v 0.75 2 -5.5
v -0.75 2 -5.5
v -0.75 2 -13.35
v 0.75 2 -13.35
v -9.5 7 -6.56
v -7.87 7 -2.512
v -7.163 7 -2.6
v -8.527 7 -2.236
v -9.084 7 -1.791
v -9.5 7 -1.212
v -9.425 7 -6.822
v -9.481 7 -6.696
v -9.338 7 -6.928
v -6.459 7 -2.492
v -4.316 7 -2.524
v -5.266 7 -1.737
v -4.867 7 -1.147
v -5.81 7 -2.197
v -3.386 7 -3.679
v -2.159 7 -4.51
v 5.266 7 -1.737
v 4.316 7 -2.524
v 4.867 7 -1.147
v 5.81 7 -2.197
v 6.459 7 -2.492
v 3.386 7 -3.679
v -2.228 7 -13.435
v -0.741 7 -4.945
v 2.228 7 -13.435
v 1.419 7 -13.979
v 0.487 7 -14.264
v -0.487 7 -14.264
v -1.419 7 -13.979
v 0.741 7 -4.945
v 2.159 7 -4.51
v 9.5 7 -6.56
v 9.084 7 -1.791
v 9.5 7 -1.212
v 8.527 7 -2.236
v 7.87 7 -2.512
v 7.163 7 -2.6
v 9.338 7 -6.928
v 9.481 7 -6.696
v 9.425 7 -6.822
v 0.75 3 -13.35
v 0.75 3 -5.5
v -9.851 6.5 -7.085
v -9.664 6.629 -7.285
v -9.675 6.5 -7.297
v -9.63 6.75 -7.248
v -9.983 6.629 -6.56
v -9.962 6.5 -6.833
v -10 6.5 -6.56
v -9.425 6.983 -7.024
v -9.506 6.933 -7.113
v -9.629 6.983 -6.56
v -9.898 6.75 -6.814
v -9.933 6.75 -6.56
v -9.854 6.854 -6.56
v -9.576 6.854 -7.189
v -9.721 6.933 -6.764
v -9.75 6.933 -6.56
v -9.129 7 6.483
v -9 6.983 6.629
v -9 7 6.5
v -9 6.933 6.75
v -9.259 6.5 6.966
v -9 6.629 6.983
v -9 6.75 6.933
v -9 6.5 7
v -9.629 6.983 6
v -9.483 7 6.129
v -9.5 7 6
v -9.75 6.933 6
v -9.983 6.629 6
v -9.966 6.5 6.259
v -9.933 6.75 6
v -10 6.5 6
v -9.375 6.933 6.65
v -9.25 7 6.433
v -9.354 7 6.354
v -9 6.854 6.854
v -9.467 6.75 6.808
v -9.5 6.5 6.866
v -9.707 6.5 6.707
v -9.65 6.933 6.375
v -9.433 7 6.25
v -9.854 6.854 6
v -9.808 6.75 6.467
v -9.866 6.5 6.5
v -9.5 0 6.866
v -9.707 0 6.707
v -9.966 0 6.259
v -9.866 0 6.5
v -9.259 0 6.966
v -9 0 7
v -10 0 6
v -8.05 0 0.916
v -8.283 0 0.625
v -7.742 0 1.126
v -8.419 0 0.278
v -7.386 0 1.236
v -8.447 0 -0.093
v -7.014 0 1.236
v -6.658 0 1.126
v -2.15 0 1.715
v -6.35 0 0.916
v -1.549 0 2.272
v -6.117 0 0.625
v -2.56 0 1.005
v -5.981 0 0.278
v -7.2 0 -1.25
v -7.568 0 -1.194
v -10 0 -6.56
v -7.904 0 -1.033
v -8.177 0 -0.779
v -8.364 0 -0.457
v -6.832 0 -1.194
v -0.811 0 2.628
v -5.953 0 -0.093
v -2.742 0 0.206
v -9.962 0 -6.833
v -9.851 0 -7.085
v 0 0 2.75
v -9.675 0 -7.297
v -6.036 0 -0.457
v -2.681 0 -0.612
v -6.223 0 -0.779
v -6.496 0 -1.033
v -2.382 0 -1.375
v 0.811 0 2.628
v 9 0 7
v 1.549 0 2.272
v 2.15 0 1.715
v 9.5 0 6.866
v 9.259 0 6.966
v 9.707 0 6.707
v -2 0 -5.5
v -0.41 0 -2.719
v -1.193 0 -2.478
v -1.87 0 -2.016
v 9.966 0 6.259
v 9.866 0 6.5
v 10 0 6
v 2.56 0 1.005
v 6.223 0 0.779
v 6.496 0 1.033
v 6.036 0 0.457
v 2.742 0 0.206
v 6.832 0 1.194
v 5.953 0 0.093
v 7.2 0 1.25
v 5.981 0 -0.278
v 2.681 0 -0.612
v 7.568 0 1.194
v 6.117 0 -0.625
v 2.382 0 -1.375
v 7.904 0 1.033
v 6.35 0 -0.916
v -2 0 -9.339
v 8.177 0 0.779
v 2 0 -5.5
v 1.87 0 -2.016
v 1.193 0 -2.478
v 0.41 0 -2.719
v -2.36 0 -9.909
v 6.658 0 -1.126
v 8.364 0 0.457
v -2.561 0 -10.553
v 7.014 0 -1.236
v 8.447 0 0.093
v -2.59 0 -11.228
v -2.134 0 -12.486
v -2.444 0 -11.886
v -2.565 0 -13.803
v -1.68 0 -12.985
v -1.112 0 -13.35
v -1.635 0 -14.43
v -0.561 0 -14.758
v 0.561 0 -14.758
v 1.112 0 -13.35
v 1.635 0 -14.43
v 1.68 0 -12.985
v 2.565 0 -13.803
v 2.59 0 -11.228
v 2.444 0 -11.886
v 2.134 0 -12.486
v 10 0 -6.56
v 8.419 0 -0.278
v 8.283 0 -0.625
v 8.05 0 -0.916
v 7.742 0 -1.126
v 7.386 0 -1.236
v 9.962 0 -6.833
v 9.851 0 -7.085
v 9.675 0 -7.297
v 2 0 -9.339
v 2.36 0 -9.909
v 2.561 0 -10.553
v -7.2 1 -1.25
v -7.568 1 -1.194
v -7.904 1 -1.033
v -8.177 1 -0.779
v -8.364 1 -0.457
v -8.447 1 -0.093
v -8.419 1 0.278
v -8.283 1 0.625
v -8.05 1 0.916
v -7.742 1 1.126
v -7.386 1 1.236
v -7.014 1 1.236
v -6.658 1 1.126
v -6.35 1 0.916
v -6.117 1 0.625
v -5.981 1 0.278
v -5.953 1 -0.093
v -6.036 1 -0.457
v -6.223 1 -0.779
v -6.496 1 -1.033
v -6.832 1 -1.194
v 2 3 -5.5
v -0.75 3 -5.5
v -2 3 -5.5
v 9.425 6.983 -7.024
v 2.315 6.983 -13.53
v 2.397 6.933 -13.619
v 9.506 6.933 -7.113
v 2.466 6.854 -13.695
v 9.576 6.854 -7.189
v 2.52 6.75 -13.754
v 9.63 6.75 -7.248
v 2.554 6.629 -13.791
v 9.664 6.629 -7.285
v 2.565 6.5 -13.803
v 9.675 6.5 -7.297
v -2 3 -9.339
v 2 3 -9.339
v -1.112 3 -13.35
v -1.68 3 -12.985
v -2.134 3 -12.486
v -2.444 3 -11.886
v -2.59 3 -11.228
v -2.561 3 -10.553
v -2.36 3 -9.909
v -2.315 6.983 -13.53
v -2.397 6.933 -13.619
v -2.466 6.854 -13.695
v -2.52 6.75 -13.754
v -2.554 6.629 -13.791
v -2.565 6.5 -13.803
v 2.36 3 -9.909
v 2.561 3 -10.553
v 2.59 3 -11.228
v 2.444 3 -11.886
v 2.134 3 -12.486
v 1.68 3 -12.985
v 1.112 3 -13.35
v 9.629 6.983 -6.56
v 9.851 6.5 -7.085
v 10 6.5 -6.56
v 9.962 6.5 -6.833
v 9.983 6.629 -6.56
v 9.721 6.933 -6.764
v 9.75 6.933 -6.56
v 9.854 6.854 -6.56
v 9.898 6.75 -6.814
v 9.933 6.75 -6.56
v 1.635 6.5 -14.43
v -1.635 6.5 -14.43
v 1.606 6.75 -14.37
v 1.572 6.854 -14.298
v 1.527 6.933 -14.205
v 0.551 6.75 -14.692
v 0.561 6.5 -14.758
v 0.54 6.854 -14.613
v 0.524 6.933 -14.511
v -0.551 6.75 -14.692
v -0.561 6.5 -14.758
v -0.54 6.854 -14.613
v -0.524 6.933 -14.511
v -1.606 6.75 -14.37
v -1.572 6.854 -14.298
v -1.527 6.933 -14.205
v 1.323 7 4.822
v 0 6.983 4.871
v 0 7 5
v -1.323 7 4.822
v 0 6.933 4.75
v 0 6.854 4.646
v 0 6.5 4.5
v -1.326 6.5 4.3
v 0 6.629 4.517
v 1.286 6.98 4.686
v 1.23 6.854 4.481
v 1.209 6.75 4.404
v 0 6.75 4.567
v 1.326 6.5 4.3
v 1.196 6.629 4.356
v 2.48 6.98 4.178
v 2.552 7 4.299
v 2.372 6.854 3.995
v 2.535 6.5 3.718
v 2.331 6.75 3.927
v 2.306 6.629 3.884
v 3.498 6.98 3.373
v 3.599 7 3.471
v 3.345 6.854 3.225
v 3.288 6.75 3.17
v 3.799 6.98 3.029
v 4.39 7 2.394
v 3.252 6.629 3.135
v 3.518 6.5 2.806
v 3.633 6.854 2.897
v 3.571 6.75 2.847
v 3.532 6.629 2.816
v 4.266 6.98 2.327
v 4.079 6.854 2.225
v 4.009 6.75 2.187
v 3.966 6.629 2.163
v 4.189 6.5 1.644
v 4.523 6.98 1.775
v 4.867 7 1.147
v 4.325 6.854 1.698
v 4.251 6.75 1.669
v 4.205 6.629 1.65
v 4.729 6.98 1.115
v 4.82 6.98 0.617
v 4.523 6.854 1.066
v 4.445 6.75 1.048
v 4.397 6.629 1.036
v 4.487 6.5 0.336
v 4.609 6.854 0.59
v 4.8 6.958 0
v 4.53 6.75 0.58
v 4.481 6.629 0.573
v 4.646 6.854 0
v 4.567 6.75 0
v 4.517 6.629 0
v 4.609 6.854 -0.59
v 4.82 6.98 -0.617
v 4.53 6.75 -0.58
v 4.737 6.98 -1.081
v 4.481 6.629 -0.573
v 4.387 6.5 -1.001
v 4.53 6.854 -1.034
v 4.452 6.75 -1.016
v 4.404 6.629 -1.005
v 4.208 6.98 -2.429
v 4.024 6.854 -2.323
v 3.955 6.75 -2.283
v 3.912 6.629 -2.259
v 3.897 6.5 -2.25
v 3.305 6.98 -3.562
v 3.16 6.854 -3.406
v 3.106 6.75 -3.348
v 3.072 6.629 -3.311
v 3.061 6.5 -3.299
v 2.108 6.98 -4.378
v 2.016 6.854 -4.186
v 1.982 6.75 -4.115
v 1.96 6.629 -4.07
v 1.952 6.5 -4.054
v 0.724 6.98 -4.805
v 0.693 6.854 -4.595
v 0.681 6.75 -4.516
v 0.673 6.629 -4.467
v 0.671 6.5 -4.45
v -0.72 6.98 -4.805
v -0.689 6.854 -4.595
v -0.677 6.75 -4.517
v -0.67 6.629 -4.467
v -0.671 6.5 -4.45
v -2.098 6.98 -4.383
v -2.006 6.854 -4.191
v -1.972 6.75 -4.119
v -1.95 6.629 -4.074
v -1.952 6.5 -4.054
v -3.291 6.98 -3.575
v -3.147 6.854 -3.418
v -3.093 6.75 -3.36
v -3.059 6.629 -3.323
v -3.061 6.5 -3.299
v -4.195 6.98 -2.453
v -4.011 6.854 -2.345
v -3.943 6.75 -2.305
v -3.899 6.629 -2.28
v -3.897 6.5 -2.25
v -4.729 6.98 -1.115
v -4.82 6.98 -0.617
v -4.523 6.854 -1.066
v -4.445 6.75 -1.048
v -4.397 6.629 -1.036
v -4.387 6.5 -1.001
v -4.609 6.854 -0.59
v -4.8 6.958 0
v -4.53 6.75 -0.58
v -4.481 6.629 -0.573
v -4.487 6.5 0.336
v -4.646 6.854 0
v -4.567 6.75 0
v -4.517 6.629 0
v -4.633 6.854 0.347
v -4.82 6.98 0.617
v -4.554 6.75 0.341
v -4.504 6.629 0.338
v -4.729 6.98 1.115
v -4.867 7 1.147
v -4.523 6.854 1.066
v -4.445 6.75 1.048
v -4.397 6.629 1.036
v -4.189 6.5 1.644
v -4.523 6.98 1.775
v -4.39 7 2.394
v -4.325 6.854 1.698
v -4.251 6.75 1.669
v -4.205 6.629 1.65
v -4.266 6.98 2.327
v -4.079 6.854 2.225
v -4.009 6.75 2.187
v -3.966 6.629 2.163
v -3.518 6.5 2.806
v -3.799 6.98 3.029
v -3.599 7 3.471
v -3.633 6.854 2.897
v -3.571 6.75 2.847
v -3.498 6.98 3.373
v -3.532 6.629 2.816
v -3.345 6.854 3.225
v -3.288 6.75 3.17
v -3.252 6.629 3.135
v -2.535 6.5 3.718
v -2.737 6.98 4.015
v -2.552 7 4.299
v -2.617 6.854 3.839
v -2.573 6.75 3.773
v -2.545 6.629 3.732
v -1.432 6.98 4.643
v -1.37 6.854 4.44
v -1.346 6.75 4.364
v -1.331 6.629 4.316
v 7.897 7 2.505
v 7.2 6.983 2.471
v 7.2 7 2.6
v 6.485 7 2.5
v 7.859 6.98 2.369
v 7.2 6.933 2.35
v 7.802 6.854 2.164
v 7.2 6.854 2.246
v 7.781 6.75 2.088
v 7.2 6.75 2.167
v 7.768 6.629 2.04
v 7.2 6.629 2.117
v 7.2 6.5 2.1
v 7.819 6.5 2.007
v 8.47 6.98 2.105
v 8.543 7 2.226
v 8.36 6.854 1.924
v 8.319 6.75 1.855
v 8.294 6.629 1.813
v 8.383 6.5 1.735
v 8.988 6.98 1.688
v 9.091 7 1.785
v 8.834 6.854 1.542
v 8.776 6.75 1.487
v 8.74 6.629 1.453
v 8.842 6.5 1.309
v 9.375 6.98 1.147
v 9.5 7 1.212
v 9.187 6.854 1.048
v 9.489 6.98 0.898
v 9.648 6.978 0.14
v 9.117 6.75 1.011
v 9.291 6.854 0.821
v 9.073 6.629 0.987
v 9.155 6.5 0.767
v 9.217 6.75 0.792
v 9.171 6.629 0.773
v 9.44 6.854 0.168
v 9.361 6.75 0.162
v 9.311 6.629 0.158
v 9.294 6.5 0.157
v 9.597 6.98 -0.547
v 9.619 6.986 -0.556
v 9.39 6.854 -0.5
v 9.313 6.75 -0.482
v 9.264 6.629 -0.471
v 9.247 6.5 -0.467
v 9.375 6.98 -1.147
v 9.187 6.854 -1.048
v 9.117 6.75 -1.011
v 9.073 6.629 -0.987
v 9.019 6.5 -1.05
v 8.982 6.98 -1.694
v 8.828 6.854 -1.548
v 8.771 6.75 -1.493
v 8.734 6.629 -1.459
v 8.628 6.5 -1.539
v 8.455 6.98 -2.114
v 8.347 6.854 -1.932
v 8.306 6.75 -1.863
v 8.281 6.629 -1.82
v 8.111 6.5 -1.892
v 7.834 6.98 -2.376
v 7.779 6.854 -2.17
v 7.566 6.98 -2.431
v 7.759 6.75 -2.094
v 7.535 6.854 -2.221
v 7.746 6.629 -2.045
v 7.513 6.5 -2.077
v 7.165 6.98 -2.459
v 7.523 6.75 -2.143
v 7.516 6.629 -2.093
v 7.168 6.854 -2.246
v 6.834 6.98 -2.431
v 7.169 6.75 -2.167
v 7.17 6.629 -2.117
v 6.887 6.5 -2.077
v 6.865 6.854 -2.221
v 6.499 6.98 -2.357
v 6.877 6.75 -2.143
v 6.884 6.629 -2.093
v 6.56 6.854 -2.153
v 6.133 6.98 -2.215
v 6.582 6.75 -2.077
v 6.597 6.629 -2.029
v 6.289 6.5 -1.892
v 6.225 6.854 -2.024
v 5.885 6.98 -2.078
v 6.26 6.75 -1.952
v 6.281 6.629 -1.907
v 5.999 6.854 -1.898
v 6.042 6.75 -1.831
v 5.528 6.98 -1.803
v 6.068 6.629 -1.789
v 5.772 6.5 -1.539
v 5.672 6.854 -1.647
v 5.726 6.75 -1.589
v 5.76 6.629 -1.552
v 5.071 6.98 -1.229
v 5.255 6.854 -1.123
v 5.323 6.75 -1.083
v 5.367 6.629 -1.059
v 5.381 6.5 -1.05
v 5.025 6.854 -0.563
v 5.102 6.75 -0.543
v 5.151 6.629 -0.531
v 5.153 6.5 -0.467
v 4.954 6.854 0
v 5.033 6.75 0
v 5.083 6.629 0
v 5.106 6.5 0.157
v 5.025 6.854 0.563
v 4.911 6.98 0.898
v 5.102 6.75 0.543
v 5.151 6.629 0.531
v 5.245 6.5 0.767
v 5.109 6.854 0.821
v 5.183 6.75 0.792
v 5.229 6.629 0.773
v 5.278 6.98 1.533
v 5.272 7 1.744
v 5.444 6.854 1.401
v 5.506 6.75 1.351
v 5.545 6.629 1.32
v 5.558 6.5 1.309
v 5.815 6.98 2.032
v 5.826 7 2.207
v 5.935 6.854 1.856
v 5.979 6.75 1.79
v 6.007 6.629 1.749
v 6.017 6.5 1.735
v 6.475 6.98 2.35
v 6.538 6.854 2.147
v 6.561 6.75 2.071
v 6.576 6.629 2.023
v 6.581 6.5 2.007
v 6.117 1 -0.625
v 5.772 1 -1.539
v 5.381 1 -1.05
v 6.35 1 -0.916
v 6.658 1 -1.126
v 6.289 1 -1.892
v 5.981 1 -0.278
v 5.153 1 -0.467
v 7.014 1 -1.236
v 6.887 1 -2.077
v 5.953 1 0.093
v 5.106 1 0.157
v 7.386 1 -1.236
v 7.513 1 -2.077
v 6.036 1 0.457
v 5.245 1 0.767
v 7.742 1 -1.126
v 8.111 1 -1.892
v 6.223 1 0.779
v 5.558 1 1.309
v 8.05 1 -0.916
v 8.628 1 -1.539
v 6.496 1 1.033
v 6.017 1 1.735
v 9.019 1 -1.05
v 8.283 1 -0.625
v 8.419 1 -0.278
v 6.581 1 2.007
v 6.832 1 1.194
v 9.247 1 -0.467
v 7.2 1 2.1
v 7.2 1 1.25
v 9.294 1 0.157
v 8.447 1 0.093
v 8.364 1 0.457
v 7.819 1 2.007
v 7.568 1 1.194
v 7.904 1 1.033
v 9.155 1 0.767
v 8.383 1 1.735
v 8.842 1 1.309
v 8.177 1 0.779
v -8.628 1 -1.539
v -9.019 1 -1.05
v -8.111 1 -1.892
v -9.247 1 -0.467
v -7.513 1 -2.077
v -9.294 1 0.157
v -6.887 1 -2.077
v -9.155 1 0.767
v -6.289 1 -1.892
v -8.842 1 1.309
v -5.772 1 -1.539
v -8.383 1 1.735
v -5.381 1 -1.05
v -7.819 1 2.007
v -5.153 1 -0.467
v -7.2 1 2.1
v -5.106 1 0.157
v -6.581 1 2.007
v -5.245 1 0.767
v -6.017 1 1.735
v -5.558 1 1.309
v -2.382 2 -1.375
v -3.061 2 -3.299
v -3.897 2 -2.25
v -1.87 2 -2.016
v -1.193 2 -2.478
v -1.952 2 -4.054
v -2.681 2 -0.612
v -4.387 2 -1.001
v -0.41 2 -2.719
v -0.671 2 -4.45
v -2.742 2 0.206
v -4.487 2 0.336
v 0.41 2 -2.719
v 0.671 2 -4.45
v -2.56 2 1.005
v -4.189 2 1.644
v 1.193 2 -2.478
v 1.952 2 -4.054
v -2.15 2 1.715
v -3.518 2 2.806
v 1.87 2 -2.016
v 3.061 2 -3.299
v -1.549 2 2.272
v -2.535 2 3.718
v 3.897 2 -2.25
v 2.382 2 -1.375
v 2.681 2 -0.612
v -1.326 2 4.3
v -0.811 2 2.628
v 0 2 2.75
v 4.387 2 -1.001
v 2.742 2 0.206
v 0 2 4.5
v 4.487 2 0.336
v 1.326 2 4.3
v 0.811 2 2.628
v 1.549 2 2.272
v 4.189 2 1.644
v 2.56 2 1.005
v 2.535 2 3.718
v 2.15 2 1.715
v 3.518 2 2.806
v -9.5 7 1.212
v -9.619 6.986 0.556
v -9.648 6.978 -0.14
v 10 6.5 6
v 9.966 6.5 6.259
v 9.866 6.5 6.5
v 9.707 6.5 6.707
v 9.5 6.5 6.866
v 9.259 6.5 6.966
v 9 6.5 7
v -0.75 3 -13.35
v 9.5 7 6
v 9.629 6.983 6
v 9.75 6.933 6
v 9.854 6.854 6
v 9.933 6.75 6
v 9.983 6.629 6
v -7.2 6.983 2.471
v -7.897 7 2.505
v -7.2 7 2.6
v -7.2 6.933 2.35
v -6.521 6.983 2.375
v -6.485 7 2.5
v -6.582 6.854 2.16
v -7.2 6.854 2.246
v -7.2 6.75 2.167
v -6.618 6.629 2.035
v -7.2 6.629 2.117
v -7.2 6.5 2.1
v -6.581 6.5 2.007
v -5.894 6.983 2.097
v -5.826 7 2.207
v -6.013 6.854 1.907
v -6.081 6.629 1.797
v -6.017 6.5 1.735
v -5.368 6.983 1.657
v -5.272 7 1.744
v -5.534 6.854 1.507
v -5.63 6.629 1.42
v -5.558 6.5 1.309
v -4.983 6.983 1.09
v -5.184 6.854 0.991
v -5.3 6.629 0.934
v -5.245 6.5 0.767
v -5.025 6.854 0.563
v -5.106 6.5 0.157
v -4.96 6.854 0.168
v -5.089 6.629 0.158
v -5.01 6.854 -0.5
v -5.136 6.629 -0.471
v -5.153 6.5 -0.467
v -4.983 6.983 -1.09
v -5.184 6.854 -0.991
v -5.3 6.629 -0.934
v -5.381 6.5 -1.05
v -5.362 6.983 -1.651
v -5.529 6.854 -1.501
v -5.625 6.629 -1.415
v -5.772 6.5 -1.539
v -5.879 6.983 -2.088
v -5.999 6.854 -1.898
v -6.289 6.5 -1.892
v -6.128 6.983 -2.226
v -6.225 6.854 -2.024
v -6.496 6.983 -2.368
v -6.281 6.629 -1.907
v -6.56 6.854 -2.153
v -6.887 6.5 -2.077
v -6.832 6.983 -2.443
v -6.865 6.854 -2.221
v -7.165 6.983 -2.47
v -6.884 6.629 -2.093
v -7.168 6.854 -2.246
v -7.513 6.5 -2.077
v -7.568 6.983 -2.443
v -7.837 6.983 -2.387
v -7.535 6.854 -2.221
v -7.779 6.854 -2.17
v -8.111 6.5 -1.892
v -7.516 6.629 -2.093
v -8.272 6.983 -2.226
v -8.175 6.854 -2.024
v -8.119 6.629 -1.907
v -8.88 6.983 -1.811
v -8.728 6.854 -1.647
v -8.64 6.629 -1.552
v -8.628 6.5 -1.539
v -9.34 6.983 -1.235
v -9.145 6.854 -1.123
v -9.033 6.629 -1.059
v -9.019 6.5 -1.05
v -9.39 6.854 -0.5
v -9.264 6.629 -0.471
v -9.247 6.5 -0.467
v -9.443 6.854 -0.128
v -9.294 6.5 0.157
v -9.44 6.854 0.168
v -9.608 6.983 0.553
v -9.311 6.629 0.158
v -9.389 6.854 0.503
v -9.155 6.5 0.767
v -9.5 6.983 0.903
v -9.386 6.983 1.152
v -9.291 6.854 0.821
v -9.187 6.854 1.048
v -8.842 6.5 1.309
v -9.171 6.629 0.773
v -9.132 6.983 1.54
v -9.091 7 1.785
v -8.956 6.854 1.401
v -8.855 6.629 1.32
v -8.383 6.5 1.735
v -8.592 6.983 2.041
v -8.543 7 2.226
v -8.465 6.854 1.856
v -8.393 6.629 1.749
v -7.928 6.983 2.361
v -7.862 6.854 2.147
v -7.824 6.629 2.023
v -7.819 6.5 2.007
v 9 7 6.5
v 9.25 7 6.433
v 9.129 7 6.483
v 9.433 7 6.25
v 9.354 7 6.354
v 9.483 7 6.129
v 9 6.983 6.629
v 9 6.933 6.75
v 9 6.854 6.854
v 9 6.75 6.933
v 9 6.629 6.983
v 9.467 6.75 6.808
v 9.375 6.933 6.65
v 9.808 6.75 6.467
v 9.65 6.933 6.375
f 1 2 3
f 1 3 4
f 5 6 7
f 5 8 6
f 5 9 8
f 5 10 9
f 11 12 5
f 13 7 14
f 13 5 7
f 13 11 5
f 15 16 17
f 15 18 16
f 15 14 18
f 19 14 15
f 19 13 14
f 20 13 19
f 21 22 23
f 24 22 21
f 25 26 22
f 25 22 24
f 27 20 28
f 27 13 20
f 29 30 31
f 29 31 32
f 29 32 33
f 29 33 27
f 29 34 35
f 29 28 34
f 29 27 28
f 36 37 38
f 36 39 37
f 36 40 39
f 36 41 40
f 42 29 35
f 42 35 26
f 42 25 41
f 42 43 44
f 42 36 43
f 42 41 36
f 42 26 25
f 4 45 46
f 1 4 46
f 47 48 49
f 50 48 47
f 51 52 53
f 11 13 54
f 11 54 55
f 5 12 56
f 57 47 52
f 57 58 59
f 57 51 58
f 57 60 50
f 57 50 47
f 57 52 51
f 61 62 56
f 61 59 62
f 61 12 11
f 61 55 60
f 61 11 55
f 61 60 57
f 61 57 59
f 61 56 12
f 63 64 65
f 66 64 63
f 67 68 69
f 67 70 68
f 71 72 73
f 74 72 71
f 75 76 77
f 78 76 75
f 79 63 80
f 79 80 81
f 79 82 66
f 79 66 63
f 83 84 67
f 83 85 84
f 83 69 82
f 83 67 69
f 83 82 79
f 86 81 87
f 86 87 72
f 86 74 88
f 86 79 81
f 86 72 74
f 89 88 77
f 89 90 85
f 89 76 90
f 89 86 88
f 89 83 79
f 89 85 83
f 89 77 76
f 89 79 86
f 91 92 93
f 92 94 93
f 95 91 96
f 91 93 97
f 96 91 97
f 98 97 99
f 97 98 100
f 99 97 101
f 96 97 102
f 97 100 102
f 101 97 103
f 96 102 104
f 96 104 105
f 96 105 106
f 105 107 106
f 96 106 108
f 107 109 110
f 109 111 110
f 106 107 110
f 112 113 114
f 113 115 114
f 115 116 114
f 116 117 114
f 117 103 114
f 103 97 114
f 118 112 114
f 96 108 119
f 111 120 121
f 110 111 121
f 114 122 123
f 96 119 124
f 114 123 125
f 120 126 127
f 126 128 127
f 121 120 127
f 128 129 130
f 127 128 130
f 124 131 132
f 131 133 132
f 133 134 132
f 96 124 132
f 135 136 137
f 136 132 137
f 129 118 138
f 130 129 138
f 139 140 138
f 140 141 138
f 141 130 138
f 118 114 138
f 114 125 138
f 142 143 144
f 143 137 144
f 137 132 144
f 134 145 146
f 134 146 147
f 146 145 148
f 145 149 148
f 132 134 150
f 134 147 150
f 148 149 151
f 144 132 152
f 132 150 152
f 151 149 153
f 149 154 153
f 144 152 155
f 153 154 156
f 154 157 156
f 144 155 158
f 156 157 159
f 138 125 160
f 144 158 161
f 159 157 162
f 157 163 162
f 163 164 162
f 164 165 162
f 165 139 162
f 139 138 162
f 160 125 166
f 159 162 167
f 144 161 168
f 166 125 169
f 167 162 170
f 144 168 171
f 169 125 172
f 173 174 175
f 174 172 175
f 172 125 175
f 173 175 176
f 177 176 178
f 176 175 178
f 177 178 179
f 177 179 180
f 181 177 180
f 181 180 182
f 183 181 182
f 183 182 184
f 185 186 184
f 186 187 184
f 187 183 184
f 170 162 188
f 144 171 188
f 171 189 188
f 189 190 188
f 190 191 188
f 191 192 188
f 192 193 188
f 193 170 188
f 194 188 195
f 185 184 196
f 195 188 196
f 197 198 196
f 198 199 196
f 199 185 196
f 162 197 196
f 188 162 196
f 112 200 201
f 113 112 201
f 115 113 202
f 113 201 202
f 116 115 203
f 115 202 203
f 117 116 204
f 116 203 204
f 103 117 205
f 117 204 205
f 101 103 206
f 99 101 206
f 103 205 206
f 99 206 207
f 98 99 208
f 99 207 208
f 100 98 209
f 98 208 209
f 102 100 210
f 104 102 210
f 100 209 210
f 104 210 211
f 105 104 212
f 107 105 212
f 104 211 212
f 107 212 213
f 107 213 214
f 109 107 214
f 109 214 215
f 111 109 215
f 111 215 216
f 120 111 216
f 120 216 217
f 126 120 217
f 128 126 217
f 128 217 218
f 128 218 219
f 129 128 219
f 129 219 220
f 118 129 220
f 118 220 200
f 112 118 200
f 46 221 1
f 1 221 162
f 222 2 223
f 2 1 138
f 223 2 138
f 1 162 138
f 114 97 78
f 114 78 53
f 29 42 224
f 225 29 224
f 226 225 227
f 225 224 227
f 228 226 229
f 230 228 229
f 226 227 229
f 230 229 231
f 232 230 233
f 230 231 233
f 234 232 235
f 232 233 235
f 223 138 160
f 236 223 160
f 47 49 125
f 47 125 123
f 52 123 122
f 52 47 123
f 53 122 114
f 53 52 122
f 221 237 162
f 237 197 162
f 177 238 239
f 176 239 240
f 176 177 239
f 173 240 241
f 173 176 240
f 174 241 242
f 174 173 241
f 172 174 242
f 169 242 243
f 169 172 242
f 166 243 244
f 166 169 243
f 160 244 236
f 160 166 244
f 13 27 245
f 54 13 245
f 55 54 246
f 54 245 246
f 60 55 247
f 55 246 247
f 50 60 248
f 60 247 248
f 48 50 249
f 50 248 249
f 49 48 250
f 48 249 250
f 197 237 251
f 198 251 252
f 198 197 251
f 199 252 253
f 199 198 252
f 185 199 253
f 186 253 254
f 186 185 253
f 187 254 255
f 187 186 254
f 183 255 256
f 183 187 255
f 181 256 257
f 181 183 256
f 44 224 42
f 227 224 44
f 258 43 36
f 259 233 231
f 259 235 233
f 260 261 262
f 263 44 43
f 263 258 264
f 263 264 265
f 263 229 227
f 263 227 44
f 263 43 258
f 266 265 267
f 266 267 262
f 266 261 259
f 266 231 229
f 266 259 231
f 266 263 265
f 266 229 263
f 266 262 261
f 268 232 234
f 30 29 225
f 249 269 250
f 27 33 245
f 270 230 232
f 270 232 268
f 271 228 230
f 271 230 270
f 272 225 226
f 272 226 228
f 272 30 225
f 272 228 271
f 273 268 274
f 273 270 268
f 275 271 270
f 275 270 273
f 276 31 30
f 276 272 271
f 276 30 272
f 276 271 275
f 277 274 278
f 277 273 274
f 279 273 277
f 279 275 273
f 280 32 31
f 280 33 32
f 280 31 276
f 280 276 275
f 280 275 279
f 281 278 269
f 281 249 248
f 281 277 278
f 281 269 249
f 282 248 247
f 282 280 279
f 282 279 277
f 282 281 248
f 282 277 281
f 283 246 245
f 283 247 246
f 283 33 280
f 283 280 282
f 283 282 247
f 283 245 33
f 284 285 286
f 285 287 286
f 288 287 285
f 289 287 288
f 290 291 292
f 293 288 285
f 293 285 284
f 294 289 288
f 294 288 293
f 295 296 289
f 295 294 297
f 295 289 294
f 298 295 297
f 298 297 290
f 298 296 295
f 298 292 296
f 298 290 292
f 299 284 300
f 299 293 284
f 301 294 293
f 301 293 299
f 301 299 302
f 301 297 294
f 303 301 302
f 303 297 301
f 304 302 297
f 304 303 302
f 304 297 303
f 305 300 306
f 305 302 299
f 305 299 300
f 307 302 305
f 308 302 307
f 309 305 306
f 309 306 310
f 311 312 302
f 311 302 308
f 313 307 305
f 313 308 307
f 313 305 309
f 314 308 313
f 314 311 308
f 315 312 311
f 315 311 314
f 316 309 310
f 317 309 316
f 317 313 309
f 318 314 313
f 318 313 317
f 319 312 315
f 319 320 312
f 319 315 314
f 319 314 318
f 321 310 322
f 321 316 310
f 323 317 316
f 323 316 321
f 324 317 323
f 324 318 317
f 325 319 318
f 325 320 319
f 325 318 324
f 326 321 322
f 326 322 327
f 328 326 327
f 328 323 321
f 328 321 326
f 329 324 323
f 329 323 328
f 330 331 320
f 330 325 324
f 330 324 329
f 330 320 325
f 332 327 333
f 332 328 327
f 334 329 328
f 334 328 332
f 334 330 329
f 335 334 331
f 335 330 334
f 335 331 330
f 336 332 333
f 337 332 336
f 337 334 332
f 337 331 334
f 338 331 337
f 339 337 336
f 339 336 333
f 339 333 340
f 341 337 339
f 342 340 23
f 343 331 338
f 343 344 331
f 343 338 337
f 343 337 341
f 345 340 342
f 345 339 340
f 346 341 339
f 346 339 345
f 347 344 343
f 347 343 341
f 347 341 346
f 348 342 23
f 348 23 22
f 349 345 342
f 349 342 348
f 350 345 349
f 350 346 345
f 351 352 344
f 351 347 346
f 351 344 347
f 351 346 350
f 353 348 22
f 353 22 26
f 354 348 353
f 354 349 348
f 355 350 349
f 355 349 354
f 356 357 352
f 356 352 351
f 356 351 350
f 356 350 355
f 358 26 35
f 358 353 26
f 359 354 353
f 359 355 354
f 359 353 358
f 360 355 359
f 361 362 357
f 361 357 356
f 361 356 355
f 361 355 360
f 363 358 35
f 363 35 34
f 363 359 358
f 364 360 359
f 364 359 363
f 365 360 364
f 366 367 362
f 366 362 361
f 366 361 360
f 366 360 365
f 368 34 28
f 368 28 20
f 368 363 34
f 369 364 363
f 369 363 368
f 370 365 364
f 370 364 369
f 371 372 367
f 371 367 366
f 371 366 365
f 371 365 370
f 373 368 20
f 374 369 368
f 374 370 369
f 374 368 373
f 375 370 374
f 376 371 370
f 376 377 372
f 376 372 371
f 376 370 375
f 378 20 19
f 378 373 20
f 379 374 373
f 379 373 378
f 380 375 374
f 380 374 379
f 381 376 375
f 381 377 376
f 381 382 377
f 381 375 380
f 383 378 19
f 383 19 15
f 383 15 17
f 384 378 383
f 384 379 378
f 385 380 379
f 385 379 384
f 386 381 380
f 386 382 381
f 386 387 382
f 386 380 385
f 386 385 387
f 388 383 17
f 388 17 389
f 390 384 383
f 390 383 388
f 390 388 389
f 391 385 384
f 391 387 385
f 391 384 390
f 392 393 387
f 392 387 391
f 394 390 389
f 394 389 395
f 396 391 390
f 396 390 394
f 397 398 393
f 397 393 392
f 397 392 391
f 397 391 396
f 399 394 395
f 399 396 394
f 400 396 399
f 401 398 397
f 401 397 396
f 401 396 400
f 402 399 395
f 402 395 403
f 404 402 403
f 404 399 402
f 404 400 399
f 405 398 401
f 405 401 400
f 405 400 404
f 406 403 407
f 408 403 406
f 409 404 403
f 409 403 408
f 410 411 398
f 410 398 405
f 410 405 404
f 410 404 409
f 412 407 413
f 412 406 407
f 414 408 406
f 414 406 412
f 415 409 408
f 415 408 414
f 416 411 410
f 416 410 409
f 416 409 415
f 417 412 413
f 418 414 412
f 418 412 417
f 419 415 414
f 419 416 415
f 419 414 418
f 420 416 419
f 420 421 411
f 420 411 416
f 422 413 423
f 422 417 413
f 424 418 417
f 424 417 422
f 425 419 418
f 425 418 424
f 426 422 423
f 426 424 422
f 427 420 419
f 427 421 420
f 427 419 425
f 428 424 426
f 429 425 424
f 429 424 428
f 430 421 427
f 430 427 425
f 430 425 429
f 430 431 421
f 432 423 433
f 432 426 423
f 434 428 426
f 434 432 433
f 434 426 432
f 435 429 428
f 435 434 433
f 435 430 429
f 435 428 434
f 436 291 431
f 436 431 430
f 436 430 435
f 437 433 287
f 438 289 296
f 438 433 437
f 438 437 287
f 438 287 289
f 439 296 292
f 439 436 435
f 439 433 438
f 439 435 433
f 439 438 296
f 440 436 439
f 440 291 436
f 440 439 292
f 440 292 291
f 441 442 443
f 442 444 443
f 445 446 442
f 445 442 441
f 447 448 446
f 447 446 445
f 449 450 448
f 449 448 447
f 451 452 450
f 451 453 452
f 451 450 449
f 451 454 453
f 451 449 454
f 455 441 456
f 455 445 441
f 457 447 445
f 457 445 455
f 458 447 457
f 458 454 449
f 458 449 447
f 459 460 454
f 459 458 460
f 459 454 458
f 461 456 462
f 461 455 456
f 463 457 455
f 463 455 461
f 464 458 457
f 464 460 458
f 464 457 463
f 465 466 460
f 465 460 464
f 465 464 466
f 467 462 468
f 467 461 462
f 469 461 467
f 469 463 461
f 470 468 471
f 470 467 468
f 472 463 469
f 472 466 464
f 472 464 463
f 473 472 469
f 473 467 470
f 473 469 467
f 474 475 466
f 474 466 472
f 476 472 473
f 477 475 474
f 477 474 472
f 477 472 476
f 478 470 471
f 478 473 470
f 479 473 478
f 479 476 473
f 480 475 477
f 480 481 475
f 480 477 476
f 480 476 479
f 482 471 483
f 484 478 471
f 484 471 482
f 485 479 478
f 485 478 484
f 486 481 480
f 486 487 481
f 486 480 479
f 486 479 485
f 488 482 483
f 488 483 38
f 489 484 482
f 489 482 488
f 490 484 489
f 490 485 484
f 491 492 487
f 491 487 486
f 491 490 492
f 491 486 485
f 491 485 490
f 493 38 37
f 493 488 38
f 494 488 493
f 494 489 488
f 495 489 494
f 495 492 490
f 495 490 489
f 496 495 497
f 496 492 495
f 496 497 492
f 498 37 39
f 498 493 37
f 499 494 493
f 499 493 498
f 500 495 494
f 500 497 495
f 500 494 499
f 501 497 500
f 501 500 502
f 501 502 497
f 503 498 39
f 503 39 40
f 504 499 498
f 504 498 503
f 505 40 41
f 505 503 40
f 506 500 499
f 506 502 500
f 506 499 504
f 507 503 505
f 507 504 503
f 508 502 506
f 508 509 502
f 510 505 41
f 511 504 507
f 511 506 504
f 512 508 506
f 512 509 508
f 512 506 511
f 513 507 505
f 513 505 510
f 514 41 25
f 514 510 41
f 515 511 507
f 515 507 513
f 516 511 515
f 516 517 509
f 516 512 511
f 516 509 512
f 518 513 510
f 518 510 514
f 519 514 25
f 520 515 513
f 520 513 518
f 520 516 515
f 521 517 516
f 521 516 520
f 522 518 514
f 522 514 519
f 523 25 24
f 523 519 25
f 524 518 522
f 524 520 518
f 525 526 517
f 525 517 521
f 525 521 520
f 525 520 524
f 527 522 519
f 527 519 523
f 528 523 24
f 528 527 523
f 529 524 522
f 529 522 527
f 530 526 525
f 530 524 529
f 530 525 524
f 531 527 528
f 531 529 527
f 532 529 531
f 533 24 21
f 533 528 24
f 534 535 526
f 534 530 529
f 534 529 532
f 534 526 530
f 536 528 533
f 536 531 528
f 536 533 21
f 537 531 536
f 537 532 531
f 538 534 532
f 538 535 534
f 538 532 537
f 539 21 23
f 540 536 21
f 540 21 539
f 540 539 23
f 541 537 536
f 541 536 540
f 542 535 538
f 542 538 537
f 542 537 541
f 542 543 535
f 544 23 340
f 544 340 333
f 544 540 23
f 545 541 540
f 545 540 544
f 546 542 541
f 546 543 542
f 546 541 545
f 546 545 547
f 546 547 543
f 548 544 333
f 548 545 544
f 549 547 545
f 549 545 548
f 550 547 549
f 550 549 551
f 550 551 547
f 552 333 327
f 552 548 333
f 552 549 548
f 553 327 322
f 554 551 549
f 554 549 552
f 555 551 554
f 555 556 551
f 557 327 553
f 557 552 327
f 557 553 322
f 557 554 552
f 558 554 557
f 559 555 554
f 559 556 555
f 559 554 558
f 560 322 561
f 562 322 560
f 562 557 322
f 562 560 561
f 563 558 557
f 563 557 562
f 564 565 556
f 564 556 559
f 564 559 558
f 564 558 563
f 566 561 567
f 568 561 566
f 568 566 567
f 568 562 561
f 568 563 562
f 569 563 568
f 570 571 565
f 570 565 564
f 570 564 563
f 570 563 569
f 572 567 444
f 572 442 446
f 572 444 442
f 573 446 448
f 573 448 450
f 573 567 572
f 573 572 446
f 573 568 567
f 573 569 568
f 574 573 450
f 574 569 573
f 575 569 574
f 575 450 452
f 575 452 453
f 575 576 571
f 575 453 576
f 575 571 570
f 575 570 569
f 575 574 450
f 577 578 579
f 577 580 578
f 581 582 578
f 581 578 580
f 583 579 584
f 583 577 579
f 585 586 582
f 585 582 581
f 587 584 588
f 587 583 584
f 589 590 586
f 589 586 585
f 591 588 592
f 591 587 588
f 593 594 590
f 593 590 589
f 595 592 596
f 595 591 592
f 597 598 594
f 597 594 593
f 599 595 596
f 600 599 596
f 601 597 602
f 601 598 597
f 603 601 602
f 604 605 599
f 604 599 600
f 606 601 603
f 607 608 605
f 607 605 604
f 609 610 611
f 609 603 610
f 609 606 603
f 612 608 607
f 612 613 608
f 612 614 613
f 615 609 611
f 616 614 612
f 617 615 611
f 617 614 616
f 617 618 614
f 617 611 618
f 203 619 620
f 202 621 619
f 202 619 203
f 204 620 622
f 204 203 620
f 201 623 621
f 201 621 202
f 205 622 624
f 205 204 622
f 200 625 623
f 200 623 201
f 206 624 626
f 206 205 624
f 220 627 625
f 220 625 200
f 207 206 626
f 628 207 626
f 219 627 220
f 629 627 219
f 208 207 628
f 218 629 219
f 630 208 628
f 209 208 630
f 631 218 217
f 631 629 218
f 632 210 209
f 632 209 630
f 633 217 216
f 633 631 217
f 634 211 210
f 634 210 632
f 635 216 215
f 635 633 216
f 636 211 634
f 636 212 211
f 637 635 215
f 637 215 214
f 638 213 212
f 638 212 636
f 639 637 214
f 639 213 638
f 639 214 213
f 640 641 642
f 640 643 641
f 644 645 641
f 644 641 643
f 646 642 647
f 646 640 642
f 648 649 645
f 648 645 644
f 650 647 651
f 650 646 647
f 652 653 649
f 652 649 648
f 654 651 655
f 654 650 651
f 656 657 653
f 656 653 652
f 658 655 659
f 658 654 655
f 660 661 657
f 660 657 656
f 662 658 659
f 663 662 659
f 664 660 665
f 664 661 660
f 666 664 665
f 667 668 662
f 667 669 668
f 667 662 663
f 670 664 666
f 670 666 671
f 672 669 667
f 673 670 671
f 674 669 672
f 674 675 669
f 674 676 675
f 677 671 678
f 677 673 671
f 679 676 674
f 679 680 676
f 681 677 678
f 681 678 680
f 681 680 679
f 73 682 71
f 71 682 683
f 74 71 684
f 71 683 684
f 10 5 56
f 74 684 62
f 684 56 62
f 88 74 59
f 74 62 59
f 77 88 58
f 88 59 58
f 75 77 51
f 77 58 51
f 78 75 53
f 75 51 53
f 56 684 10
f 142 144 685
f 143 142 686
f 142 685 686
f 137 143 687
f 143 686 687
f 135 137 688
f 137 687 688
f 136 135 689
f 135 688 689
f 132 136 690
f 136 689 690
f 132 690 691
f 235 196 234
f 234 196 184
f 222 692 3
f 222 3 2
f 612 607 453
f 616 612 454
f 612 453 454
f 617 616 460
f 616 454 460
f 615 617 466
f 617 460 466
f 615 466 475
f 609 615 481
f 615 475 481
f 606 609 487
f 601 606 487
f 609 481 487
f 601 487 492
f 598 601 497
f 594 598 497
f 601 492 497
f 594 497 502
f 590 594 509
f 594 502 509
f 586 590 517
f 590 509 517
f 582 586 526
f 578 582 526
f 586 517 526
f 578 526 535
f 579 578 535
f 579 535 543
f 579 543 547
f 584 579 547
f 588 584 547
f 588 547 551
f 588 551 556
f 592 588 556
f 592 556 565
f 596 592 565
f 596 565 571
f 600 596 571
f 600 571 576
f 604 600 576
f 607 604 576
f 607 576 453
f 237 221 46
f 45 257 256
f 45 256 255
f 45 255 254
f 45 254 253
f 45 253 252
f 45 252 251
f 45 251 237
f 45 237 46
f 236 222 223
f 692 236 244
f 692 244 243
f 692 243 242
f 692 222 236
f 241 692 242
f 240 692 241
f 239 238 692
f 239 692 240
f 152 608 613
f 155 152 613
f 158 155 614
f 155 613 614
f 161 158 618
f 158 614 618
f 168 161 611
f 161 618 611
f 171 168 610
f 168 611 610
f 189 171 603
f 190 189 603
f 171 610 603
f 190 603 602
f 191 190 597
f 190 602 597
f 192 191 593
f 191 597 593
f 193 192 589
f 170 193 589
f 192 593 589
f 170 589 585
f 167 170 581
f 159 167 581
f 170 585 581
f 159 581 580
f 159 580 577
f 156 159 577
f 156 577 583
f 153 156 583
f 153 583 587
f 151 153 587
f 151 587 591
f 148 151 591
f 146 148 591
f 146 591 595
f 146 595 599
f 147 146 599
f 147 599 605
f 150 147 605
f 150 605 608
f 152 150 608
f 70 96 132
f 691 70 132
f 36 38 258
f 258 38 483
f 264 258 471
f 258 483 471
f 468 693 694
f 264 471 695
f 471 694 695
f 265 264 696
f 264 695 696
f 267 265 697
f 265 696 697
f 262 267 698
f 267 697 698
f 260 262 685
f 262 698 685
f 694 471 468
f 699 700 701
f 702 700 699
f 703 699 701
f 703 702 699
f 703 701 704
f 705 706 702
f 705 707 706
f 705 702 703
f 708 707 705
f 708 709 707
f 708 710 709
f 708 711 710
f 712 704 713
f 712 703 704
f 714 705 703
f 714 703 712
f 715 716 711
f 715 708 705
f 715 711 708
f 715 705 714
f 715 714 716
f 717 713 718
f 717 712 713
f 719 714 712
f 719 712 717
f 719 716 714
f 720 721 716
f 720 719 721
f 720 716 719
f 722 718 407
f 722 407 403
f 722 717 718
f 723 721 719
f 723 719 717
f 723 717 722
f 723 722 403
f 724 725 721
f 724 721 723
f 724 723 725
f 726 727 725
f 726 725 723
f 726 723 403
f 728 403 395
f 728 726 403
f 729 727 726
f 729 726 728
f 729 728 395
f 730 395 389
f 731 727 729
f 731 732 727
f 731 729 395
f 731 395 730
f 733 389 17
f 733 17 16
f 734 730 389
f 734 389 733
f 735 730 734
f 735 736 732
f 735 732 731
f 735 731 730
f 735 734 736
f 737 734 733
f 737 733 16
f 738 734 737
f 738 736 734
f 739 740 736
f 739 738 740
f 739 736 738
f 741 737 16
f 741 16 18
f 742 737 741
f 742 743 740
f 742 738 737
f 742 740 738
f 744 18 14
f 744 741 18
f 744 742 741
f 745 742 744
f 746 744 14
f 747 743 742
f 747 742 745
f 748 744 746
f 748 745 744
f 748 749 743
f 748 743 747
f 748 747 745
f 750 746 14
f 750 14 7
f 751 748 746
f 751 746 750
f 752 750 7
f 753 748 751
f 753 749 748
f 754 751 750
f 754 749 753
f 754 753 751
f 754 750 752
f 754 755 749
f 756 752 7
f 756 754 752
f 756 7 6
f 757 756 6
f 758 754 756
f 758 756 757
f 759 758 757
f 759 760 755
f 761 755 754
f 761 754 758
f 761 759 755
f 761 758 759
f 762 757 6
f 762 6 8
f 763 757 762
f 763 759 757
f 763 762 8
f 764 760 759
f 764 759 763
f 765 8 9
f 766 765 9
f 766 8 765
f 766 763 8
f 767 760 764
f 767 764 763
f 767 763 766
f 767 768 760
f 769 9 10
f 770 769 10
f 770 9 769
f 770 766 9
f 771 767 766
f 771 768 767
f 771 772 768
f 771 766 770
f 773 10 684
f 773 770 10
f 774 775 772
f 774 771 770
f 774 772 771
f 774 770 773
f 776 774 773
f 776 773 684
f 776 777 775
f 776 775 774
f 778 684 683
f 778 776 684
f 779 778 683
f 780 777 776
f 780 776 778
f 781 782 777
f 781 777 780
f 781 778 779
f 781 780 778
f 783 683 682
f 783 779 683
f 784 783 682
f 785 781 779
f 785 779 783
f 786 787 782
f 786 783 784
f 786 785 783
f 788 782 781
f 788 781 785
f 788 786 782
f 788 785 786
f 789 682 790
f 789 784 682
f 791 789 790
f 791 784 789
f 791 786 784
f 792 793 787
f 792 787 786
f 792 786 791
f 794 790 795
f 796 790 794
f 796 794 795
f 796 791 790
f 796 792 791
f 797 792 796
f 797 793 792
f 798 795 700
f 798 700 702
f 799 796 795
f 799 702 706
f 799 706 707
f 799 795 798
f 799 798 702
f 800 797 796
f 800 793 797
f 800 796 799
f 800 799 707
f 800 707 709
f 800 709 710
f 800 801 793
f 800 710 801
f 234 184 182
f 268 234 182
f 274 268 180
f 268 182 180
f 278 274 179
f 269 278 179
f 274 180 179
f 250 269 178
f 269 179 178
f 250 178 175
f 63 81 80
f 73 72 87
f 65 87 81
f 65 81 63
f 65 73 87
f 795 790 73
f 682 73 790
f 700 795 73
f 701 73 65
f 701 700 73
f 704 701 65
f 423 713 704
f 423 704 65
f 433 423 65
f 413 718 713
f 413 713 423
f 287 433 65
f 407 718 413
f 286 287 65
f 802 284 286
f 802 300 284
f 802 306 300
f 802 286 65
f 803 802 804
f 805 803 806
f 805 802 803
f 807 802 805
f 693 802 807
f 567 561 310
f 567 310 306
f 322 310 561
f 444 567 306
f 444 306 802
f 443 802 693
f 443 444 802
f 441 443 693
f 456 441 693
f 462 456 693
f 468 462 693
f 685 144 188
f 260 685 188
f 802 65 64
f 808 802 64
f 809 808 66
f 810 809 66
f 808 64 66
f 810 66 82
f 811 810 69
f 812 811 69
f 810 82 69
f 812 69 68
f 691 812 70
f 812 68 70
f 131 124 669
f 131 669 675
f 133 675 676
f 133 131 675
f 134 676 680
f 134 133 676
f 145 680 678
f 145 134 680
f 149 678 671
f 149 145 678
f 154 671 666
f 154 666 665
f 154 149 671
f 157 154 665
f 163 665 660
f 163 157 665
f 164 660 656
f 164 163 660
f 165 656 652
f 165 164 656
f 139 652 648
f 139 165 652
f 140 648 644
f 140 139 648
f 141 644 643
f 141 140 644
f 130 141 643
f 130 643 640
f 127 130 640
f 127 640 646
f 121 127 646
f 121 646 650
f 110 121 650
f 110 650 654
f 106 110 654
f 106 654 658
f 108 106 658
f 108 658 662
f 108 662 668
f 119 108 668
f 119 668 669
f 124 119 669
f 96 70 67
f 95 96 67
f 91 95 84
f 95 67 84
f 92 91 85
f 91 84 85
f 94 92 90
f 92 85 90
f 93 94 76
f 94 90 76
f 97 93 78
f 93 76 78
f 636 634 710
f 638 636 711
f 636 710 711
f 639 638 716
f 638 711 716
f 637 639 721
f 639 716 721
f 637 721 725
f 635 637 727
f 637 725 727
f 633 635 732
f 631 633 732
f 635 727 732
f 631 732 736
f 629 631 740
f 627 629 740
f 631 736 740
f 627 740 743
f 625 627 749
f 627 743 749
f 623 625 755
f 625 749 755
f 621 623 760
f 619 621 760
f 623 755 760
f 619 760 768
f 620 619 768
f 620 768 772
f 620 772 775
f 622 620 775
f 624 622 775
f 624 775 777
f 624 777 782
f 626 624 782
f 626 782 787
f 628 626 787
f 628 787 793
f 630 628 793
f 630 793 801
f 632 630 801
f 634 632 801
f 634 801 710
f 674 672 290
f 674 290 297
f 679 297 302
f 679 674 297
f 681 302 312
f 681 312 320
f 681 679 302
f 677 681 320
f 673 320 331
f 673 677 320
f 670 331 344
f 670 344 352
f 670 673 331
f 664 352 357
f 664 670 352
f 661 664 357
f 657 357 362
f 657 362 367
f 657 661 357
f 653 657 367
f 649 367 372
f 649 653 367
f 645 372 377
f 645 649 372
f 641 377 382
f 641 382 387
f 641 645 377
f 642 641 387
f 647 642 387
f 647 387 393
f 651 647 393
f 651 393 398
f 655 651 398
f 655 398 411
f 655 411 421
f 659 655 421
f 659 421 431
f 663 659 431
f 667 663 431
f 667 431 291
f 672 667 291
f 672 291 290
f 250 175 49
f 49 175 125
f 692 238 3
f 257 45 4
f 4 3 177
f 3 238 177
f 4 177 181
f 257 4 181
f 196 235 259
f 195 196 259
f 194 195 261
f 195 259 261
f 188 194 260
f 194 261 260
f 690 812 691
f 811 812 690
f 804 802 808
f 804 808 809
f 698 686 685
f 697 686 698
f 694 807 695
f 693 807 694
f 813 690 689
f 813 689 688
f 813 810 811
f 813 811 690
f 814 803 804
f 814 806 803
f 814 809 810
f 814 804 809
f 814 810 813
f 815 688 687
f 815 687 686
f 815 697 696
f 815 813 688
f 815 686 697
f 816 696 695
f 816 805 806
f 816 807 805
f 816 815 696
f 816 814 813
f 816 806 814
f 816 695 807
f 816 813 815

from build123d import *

# Parameters (mm, degrees)
SKETCH_1_W          = 20
SKETCH_1_H          = 14
SKETCH_1_R          = 2.75
SKETCH_1_R_2        = 3.8
SKETCH_1_R_3        = 2.6
EXTRUDE_1_DEPTH     = 7
CUT_EXTRUDE_START   = -5
SKETCH_2_R          = 4.5
SKETCH_2_R_2        = 2.75
CUT_EXTRUDE_1_DEPTH = 5
SKETCH_8_R          = 1.25
CUT_EXTRUDE_3_DEPTH = 20.184368637
SKETCH_9_R          = 2.1
SKETCH_9_R_2        = 1.25
CUT_EXTRUDE_4_DEPTH = 6
EXTRUDE_START       = -4
EXTRUDE_2_DEPTH     = 4
SKETCH_11_W         = 1.5
SKETCH_11_H         = 4.7
EXTRUDE_3_DEPTH     = 1
CUT_EXTRUDE_5_DEPTH = 2
CUT_EXTRUDE_6_DEPTH = 1
FILLET_1_R          = 1
FILLET_2_R          = 0.5


with BuildPart() as part:
    # Эскиз1 → Бобышка-Вытянуть1 (new body)
    # profile 1 of 5: a face of its own
    with BuildSketch(Plane(origin=(0, 0, 0), x_dir=(1, 0, 0), z_dir=(0, 1, 0))):
        Rectangle(SKETCH_1_W, SKETCH_1_H)
        with Locations(Location((0, 0, 0), (0, 0, 270))):
            Circle(SKETCH_1_R, mode=Mode.SUBTRACT)
    # profile 2 of 5: a face of its own
    with BuildSketch(Plane(origin=(0, 0, 0), x_dir=(1, 0, 0), z_dir=(0, 1, 0))):
        with BuildLine():
            Line((-2.565353551, 13.803383877), (-10, 7))
            Line((-10, 7), (10, 7))
            Line((10, 7), (2.565353551, 13.803383877))
            ThreePointArc((2.565353551, 13.803383877), (3.477667573, 12.531609694), (3.8, 11))
            ThreePointArc((3.8, 11), (-1.531609694, 7.522332427), (-2.565353551, 13.803383877))
        make_face()
    # profile 3 of 5: a face of its own
    with BuildSketch(Plane(origin=(0, 0, 0), x_dir=(1, 0, 0), z_dir=(0, 1, 0))):
        with Locations((0, 11)):
            Circle(SKETCH_1_R_2)
        with Locations((0, 11)):
            Circle(SKETCH_1_R_3, mode=Mode.SUBTRACT)
    # profile 4 of 5: a face of its own
    with BuildSketch(Plane(origin=(0, 0, 0), x_dir=(1, 0, 0), z_dir=(0, 1, 0))):
        with BuildLine():
            ThreePointArc((1.112429773, 13.35), (0, 13.6), (-1.112429773, 13.35))
            Line((-1.112429773, 13.35), (1.112429773, 13.35))
        make_face()
    # profile 5 of 5: a face of its own
    with BuildSketch(Plane(origin=(0, 0, 0), x_dir=(1, 0, 0), z_dir=(0, 1, 0))):
        with BuildLine():
            Line((1.112429773, 8.65), (-1.112429773, 8.65))
            ThreePointArc((-1.112429773, 8.65), (0, 8.4), (1.112429773, 8.65))
        make_face()
    extrude(amount=EXTRUDE_1_DEPTH)

    # Эскиз2 → Вырез-Вытянуть1 (cut)
    with BuildSketch(Plane(origin=(0, 7, 0), x_dir=(1, 0, 0), z_dir=(0, 1, 0)).offset(CUT_EXTRUDE_START)):
        with Locations(Location((0, 0, 0), (0, 0, 270))):
            Circle(SKETCH_2_R)
        with Locations(Location((0, 0, 0), (0, 0, 270))):
            Circle(SKETCH_2_R_2, mode=Mode.SUBTRACT)
    extrude(amount=CUT_EXTRUDE_1_DEPTH, mode=Mode.SUBTRACT)

    # Эскиз8 → Вырез-Вытянуть3 (cut, through all)
    with BuildSketch(Plane(origin=(0, 7, 0), x_dir=(1, 0, 0), z_dir=(0, 1, 0))):
        with Locations(Location((7.2, 0, 0), (0, 0, 270))):
            Circle(SKETCH_8_R)
        with Locations(Location((-7.2, 0, 0), (0, 0, 90))):
            Circle(SKETCH_8_R)
    extrude(amount=-CUT_EXTRUDE_3_DEPTH, mode=Mode.SUBTRACT)

    # Эскиз9 → Вырез-Вытянуть4 (cut)
    # profile 1 of 2: a face of its own
    with BuildSketch(Plane(origin=(0, 7, 0), x_dir=(1, 0, 0), z_dir=(0, 1, 0))):
        with Locations(Location((-7.2, 0, 0), (0, 0, 270))):
            Circle(SKETCH_9_R)
        with Locations(Location((-7.2, 0, 0), (0, 0, 270))):
            Circle(SKETCH_9_R_2, mode=Mode.SUBTRACT)
    # profile 2 of 2: a face of its own
    with BuildSketch(Plane(origin=(0, 7, 0), x_dir=(1, 0, 0), z_dir=(0, 1, 0))):
        with Locations(Location((7.2, 0, 0), (0, 0, 270))):
            Circle(SKETCH_9_R)
        with Locations(Location((7.2, 0, 0), (0, 0, 270))):
            Circle(SKETCH_9_R_2, mode=Mode.SUBTRACT)
    extrude(amount=-CUT_EXTRUDE_4_DEPTH, mode=Mode.SUBTRACT)

    # Эскиз10 → Бобышка-Вытянуть2 (add)
    with BuildSketch(Plane(origin=(0, 7, 0), x_dir=(1, 0, 0), z_dir=(0, 1, 0)).offset(EXTRUDE_START)):
        with BuildLine():
            ThreePointArc((1.112429773, 13.35), (2.6, 11), (1.112429773, 8.65))
            Line((1.112429773, 8.65), (-1.112429773, 8.65))
            ThreePointArc((-1.112429773, 8.65), (-2.6, 11), (-1.112429773, 13.35))
            Line((-1.112429773, 13.35), (1.112429773, 13.35))
        make_face()
    extrude(amount=EXTRUDE_2_DEPTH)

    # Эскиз11 → Бобышка-Вытянуть3 (add)
    with BuildSketch(Plane.XZ.offset(-3)):
        with Locations((0, -11)):
            Rectangle(SKETCH_11_W, SKETCH_11_H)
    extrude(amount=EXTRUDE_3_DEPTH)

    # Эскиз12 → Вырез-Вытянуть5 (cut)
    with BuildSketch(Plane.XZ):
        Polygon((-2, -5.5), (-2, -8.65), (-1.112429773, -8.65), (1.112429773, -8.65), (2, -8.65), (2, -5.5), align=None)
        with BuildLine():
            Line((-1.112429773, -8.65), (-2, -8.65))
            Line((-2, -8.65), (-2, -9.338675227))
            ThreePointArc((-2, -9.338675227), (-1.593854813, -8.945826971), (-1.112429773, -8.65))
        make_face()
        with BuildLine():
            Line((2, -8.65), (1.112429773, -8.65))
            ThreePointArc((1.112429773, -8.65), (1.593854813, -8.945826971), (2, -9.338675227))
            Line((2, -9.338675227), (2, -8.65))
        make_face()
    extrude(amount=-CUT_EXTRUDE_5_DEPTH, mode=Mode.SUBTRACT)

    # Эскиз13 → Вырез-Вытянуть6 (cut)
    with BuildSketch(Plane.XZ.offset(-2)):
        with BuildLine():
            Line((2, -5.5), (0.75, -5.5))
            Line((0.75, -5.5), (0.75, -8.65))
            Line((0.75, -8.65), (1.112429773, -8.65))
            ThreePointArc((1.112429773, -8.65), (1.593854813, -8.945826971), (2, -9.338675227))
            Line((2, -9.338675227), (2, -5.5))
        make_face()
        with BuildLine():
            Line((-1.112429773, -8.65), (-0.75, -8.65))
            Line((-0.75, -8.65), (-0.75, -5.5))
            Line((-0.75, -5.5), (-2, -5.5))
            Line((-2, -5.5), (-2, -9.338675227))
            ThreePointArc((-2, -9.338675227), (-1.593854813, -8.945826971), (-1.112429773, -8.65))
        make_face()
    extrude(amount=-CUT_EXTRUDE_6_DEPTH, mode=Mode.SUBTRACT)

    # Скругление1
    fillet_1_edges = [part.edges().sort_by_distance(p)[0] for p in [
        (-10, 3.5, 7),
        (-10, 3.5, -7),
        (10, 3.5, -7),
        (10, 3.5, 7),
    ]]
    fillet(fillet_1_edges, radius=FILLET_1_R)

    # Скругление2
    # the kernel refuses this fillet: 0.5 mm, written as the material it takes off along each edge
    with BuildSketch(Plane(origin=(-10, 7, -6.559587091), x_dir=(1, 0, 0), z_dir=(0, 0, 1)), Plane(origin=(10, 7, 6), x_dir=(-1, 0, 0), z_dir=(0, 0, -1))) as fillet_2_piece_1:
        with BuildLine():
            CenterArc((FILLET_2_R, -FILLET_2_R), FILLET_2_R, 90, 90)
            Line((0, -FILLET_2_R), (0, 0))
            Line((0, 0), (FILLET_2_R, 0))
        make_face()
    extrude(amount=12.559587091, mode=Mode.SUBTRACT)
    with BuildSketch(Plane(origin=(-2.565353551, 7, -13.803383877), x_dir=(0.6750930396508724, 0, 0.7377325991271809), z_dir=(-0.7377325991271809, 0, 0.6750930396508723)), Plane(origin=(9.67509304, 7, -7.29731969), x_dir=(-0.6750930396508725, 0, 0.7377325991271807), z_dir=(-0.7377325991271807, 0, -0.6750930396508726))) as fillet_2_piece_2:
        with BuildLine():
            CenterArc((FILLET_2_R, -FILLET_2_R), FILLET_2_R, 90, 90)
            Line((0, -FILLET_2_R), (0, 0))
            Line((0, 0), (FILLET_2_R, 0))
        make_face()
    extrude(amount=9.63728524, mode=Mode.SUBTRACT)
    with BuildSketch(Plane(origin=(-9, 7, 7), x_dir=(0, -1, 0), z_dir=(1, 0, 0))) as fillet_2_piece_3:
        with BuildLine():
            CenterArc((FILLET_2_R, FILLET_2_R), FILLET_2_R, 180, 90)
            Line((0, FILLET_2_R), (0, 0))
            Line((0, 0), (FILLET_2_R, 0))
        make_face()
    extrude(amount=18, mode=Mode.SUBTRACT)
    with BuildSketch(Plane(origin=(9, 7, -6.559587091), x_dir=(0.6750930396508728, 0, -0.7377325991271806), z_dir=(-0.7377325991271806, 0, -0.6750930396508728))) as fillet_2_piece_4:
        with BuildLine():
            CenterArc((1 - FILLET_2_R, FILLET_2_R), FILLET_2_R, 270, 90)
            Line((1, FILLET_2_R), (1, 0))
            Line((1, 0), (1 - FILLET_2_R, 0))
        make_face()
    revolve(axis=Axis((9, 7, -6.559587091), (0, -1, 0)), revolution_arc=47.538624316, mode=Mode.SUBTRACT)
    with BuildSketch(Plane(origin=(9, 7, 6), x_dir=(0, 0, 1), z_dir=(-1, 0, 0))) as fillet_2_piece_5:
        with BuildLine():
            CenterArc((1 - FILLET_2_R, -FILLET_2_R), FILLET_2_R, 0, 90)
            Line((1 - FILLET_2_R, 0), (1, 0))
            Line((1, 0), (1, -FILLET_2_R))
        make_face()
    revolve(axis=Axis((9, 7, 6), (0, 1, 0)), revolution_arc=90, mode=Mode.SUBTRACT)
    with BuildSketch(Plane(origin=(-9, 7, 6), x_dir=(0, 0, 1), z_dir=(1, 0, 0))) as fillet_2_piece_6:
        with BuildLine():
            CenterArc((1 - FILLET_2_R, FILLET_2_R), FILLET_2_R, 270, 90)
            Line((1 - FILLET_2_R, 0), (1, 0))
            Line((1, 0), (1, FILLET_2_R))
        make_face()
    revolve(axis=Axis((-9, 7, 6), (0, -1, 0)), revolution_arc=90, mode=Mode.SUBTRACT)
    with BuildSketch(Plane(origin=(-9, 7, -6.559587091), x_dir=(-0.6750930396508718, 0, -0.7377325991271815), z_dir=(0.7377325991271815, 0, -0.6750930396508718))) as fillet_2_piece_7:
        with BuildLine():
            CenterArc((1 - FILLET_2_R, -FILLET_2_R), FILLET_2_R, 0, 90)
            Line((1, -FILLET_2_R), (1, 0))
            Line((1, 0), (1 - FILLET_2_R, 0))
        make_face()
    revolve(axis=Axis((-9, 7, -6.559587091), (0, 1, 0)), revolution_arc=47.538624316, mode=Mode.SUBTRACT)
    with BuildSketch(Plane(origin=(0, 7, -11), x_dir=(0.6750930396508724, 0, -0.7377325991271808), z_dir=(0.7377325991271808, 0, 0.6750930396508724))) as fillet_2_piece_8:
        with BuildLine():
            CenterArc((3.8 - FILLET_2_R, -FILLET_2_R), FILLET_2_R, 0, 90)
            Line((3.8, -FILLET_2_R), (3.8, 0))
            Line((3.8, 0), (3.8 - FILLET_2_R, 0))
        make_face()
    revolve(axis=Axis((0, 7, -11), (0, 1, 0)), revolution_arc=84.922751368, mode=Mode.SUBTRACT)
    with BuildSketch(Plane(origin=(0, 7, 0), x_dir=(0, 0, 1), z_dir=(-1, 0, 0))) as fillet_2_piece_9:
        with BuildLine():
            CenterArc((4.5 + FILLET_2_R, -FILLET_2_R), FILLET_2_R, 90, 90)
            Line((4.5, -FILLET_2_R), (4.5, 0))
            Line((4.5, 0), (4.5 + FILLET_2_R, 0))
        make_face()
    revolve(axis=Axis((0, 7, 0), (0, 1, 0)), mode=Mode.SUBTRACT)
    with BuildSketch(Plane(origin=(-7.2, 7, 0), x_dir=(0, 0, 1), z_dir=(-1, 0, 0))) as fillet_2_piece_10:
        with BuildLine():
            CenterArc((2.1 + FILLET_2_R, -FILLET_2_R), FILLET_2_R, 90, 90)
            Line((2.1, -FILLET_2_R), (2.1, 0))
            Line((2.1, 0), (2.1 + FILLET_2_R, 0))
        make_face()
    revolve(axis=Axis((-7.2, 7, 0), (0, 1, 0)), mode=Mode.SUBTRACT)
    with BuildSketch(Plane(origin=(7.2, 7, 0), x_dir=(0, 0, 1), z_dir=(-1, 0, 0))) as fillet_2_piece_11:
        with BuildLine():
            CenterArc((2.1 + FILLET_2_R, -FILLET_2_R), FILLET_2_R, 90, 90)
            Line((2.1, -FILLET_2_R), (2.1, 0))
            Line((2.1, 0), (2.1 + FILLET_2_R, 0))
        make_face()
    revolve(axis=Axis((7.2, 7, 0), (0, 1, 0)), mode=Mode.SUBTRACT)


solid = part.part
